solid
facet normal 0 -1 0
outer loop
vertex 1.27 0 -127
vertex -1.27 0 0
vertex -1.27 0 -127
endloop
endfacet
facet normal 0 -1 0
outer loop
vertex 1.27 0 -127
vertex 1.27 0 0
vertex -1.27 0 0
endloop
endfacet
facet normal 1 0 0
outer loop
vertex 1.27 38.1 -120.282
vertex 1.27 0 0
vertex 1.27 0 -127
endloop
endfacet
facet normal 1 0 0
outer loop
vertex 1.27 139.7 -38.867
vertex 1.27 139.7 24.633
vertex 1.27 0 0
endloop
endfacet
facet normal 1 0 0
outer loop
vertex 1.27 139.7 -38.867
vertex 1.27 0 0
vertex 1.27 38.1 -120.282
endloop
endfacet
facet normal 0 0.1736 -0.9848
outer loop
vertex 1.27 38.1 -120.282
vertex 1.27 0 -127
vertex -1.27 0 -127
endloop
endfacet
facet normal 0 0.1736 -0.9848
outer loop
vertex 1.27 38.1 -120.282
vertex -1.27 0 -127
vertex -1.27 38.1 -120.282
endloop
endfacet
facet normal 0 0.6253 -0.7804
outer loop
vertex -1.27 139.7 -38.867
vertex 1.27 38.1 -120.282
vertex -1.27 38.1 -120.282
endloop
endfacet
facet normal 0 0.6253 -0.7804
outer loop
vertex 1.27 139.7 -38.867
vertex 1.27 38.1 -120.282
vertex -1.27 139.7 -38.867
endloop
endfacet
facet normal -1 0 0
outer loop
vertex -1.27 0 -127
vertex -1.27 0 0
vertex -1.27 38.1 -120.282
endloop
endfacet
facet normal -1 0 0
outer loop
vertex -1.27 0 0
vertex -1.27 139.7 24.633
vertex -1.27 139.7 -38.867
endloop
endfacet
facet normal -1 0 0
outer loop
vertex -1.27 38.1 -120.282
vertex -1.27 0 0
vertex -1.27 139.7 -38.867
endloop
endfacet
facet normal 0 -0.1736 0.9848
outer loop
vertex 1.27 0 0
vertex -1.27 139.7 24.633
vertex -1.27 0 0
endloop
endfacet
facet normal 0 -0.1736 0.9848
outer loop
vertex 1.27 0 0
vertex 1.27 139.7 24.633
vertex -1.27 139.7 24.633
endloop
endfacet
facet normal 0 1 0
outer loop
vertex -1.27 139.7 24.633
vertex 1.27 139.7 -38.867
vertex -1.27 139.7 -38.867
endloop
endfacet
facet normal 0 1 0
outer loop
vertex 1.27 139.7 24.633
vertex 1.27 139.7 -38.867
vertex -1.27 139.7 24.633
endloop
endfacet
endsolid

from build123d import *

# Parameters (mm, degrees)
BOSS_EXTRUDE1_DEPTH      = 1.27
BOSS_EXTRUDE1_DEPTH_BACK = 1.27


with BuildPart() as part:
    # Sketch1 → Boss-Extrude1 (new, two sides: drawn at the far end of the back side and taken through both)
    with BuildSketch(Plane(origin=(0, 0, 0), x_dir=(0, 0, -1), z_dir=(1, 0, 0)).offset(-BOSS_EXTRUDE1_DEPTH_BACK)):
        Polygon((0, 0), (127, 0), (120.281942035, 38.1), (38.867120795, 139.7), (-24.632879205, 139.7), align=None)
    extrude(amount=BOSS_EXTRUDE1_DEPTH + BOSS_EXTRUDE1_DEPTH_BACK)


solid = part.part
